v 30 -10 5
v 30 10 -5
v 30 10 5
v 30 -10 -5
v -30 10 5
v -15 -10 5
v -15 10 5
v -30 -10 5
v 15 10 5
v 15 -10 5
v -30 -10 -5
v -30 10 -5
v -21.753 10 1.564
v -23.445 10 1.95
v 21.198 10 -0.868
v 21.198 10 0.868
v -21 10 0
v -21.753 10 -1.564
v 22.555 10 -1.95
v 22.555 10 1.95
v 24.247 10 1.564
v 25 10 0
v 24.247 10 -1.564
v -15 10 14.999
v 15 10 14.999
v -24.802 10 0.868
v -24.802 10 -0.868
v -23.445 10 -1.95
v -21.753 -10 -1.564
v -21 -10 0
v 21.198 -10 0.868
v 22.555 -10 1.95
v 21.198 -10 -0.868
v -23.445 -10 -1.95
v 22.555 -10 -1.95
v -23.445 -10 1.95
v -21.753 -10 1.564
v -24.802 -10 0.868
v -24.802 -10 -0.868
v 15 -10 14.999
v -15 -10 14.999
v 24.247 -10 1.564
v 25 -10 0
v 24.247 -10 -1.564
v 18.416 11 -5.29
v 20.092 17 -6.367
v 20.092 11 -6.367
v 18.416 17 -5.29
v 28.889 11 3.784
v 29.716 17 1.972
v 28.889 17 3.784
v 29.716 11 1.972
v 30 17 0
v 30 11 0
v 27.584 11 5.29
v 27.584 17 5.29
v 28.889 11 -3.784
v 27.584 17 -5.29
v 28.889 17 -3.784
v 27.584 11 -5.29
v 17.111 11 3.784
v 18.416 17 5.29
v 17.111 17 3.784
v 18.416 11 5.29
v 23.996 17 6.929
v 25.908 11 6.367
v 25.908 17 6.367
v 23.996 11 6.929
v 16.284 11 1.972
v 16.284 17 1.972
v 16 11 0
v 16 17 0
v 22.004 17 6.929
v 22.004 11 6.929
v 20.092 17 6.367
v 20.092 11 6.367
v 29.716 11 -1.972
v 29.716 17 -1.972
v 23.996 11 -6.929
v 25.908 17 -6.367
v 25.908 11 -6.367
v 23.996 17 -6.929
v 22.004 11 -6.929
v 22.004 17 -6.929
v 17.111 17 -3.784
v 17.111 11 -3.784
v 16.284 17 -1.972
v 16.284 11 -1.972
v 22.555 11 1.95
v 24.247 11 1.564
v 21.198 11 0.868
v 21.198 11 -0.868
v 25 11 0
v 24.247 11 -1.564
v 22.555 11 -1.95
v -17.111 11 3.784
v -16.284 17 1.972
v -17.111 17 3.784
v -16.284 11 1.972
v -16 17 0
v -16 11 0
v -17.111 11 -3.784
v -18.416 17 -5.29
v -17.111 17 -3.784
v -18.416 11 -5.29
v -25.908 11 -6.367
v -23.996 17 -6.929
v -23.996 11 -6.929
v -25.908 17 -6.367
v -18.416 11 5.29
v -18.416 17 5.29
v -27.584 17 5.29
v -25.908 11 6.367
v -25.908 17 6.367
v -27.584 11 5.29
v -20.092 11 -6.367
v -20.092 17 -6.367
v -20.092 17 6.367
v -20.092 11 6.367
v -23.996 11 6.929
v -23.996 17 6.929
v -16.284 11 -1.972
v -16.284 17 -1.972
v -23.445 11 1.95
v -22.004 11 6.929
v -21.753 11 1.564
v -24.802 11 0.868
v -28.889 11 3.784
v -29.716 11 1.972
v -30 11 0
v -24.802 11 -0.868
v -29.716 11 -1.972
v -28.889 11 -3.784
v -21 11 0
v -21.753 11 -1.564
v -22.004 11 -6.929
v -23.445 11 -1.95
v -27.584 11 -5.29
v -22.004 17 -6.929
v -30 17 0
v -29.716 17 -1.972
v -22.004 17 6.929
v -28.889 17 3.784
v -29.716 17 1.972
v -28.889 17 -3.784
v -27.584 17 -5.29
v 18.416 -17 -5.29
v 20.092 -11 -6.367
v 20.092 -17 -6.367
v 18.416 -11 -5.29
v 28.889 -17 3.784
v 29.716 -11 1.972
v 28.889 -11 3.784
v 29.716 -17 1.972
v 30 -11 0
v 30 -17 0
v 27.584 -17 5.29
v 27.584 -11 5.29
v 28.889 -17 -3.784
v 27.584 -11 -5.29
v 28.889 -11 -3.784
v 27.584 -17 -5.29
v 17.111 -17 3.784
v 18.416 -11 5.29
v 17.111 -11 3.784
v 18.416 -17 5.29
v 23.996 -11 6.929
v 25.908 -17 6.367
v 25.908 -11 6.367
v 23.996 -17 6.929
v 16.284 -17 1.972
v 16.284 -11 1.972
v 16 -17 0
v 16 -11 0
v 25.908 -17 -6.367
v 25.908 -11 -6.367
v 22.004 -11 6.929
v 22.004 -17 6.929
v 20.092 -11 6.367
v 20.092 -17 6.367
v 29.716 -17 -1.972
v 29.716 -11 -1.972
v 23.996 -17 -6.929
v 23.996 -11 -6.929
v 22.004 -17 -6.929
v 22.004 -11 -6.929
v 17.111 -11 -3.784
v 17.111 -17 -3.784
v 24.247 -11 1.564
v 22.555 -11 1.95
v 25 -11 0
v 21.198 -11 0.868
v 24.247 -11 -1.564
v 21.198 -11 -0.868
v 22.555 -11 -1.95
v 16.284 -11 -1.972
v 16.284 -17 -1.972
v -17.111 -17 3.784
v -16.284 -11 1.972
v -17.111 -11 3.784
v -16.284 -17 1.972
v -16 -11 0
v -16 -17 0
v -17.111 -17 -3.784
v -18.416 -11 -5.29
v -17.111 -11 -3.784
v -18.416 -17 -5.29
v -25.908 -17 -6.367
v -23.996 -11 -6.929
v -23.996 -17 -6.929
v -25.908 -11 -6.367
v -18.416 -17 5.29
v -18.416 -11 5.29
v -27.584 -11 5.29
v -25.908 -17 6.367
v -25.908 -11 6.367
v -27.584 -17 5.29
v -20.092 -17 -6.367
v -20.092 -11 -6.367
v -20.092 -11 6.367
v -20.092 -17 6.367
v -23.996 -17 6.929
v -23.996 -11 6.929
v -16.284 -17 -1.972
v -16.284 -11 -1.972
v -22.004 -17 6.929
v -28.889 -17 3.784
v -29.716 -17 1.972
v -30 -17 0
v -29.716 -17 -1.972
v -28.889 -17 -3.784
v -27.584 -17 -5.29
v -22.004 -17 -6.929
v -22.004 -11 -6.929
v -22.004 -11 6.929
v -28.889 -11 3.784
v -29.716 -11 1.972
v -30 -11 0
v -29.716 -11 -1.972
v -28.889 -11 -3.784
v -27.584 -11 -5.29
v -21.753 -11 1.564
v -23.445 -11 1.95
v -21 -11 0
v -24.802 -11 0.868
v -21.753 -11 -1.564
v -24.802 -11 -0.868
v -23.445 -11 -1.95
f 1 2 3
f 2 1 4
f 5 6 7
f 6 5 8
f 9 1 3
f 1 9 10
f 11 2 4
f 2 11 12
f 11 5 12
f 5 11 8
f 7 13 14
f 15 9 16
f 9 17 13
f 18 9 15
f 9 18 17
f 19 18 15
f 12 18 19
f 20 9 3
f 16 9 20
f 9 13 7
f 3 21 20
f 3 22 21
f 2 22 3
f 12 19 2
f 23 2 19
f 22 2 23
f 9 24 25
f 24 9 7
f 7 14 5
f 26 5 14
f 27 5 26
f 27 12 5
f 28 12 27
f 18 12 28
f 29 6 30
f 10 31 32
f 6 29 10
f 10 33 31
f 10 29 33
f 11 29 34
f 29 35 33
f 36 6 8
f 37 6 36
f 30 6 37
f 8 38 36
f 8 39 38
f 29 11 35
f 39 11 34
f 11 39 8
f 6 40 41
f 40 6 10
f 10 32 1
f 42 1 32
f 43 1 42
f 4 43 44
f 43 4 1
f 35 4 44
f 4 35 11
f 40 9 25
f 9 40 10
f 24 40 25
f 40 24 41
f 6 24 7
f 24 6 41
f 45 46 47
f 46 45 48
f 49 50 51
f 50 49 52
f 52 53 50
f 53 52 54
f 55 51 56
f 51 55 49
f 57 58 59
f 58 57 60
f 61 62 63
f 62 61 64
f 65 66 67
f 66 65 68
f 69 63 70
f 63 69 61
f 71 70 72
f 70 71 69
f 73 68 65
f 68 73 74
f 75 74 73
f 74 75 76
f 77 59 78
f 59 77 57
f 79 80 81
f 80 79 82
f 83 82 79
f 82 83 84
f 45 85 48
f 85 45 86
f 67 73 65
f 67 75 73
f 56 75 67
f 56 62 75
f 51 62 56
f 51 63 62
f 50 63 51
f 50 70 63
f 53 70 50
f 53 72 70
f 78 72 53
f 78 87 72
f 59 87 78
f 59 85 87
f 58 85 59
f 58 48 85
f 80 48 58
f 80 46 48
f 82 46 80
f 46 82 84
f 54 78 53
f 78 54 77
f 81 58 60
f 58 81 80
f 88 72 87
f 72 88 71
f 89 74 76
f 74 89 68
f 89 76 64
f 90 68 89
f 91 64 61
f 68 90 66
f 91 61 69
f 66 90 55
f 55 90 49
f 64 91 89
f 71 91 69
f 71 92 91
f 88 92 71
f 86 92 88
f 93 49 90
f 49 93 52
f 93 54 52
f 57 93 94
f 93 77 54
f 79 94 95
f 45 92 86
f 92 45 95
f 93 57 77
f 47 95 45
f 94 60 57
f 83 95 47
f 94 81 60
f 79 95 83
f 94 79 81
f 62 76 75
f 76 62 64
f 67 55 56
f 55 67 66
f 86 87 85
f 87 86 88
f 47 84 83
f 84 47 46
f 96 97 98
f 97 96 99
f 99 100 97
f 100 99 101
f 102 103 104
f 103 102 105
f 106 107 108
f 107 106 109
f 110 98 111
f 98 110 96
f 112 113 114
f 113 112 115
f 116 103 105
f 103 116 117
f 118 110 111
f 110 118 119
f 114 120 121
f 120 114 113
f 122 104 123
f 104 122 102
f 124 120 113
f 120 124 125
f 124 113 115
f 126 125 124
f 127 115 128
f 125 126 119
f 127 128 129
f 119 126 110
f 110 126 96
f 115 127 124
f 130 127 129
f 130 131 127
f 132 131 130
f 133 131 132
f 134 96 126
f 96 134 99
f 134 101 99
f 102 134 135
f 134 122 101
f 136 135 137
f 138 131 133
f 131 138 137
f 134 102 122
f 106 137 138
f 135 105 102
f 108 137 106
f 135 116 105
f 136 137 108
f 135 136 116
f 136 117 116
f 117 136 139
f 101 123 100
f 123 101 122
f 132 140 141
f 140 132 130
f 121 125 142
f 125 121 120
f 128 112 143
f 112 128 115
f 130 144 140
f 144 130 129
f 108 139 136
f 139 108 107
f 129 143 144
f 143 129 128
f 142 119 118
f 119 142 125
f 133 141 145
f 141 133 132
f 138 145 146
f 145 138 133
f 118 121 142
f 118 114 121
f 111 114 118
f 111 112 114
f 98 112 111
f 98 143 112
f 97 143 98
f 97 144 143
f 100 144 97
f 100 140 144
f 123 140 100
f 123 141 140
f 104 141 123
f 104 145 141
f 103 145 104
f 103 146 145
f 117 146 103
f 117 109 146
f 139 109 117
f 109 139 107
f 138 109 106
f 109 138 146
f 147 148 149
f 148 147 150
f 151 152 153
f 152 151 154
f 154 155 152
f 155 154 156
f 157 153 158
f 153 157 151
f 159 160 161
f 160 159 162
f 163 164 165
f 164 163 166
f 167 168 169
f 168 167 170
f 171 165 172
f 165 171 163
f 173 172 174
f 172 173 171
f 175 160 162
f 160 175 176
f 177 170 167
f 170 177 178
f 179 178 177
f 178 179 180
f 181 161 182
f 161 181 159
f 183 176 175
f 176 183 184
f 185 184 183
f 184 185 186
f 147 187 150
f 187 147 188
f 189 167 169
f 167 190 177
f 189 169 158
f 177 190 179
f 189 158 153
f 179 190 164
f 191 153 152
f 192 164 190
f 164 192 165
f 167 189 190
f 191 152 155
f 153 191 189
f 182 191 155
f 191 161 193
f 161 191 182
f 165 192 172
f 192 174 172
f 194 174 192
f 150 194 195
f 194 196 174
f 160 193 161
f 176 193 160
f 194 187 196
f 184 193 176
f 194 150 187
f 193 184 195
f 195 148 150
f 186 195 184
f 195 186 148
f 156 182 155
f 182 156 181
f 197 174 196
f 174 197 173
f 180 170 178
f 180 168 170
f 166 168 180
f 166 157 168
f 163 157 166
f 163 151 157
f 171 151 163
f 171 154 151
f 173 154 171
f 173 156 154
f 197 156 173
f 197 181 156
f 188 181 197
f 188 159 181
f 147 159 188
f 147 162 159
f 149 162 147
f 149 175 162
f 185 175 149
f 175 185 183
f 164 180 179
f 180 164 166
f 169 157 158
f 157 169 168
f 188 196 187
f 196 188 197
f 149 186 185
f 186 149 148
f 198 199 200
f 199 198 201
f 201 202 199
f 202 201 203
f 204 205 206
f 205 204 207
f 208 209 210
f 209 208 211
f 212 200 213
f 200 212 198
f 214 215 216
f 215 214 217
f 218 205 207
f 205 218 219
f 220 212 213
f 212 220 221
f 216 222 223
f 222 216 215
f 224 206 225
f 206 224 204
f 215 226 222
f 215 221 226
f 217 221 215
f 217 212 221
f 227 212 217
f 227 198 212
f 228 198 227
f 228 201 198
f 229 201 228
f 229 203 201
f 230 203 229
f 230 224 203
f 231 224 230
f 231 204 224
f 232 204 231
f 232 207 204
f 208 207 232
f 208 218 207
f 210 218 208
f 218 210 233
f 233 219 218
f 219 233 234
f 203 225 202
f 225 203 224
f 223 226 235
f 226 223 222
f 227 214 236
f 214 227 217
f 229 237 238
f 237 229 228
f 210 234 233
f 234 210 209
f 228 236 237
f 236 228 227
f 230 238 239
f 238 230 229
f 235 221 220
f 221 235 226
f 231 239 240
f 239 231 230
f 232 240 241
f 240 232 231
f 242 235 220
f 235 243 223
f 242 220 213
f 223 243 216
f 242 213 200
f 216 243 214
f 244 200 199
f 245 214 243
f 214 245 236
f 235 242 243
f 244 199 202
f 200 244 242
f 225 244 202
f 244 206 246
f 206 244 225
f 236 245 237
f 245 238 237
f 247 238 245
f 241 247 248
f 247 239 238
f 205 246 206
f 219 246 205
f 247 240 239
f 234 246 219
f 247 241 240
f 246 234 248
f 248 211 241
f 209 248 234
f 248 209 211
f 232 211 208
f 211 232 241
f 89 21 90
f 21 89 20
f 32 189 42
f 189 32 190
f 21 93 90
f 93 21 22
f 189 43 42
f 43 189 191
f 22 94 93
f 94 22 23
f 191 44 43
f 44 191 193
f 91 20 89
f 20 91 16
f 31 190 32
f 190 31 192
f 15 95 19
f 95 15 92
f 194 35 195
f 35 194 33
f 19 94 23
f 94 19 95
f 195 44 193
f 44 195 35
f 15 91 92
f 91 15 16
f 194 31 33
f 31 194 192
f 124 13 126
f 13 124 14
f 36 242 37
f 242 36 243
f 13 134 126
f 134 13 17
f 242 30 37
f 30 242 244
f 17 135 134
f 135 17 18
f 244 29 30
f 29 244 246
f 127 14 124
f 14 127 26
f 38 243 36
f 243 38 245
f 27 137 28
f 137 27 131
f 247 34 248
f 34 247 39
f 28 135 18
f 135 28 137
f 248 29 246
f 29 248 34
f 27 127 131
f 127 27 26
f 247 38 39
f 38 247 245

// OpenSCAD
// Base
cube([60, 20, 10], center = true);

// Roof
color("orange") translate([0, 0, 10 - 0.001])
    cube([30, 20, 10], center = true);

// Wheels
color("grey") translate([30 - 7, 20 - 6, 0]) rotate([90, 0, 0])
    cylinder(h = 6, r = 7, center = true);

color("grey") translate([-(30 - 7), 20 - 6, 0]) rotate([90, 0, 0])
    cylinder(h = 6, r = 7, center = true);

color("grey") translate([30 - 7, -(20 - 6), 0]) rotate([90, 0, 0])
    cylinder(h = 6, r = 7, center = true);

color("grey") translate([-(30 - 7), -(20 - 6), 0]) rotate([90, 0, 0])
    cylinder(h = 6, r = 7, center = true);

// Axle
color("black") translate([30 - 7, 0, 0]) rotate([90, 0, 0])
    cylinder(h = 24, r = 2, center = true);

color("black") translate([-(30 - 7), 0, 0]) rotate([90, 0, 0])
    cylinder(h = 24, r = 2, center = true);
